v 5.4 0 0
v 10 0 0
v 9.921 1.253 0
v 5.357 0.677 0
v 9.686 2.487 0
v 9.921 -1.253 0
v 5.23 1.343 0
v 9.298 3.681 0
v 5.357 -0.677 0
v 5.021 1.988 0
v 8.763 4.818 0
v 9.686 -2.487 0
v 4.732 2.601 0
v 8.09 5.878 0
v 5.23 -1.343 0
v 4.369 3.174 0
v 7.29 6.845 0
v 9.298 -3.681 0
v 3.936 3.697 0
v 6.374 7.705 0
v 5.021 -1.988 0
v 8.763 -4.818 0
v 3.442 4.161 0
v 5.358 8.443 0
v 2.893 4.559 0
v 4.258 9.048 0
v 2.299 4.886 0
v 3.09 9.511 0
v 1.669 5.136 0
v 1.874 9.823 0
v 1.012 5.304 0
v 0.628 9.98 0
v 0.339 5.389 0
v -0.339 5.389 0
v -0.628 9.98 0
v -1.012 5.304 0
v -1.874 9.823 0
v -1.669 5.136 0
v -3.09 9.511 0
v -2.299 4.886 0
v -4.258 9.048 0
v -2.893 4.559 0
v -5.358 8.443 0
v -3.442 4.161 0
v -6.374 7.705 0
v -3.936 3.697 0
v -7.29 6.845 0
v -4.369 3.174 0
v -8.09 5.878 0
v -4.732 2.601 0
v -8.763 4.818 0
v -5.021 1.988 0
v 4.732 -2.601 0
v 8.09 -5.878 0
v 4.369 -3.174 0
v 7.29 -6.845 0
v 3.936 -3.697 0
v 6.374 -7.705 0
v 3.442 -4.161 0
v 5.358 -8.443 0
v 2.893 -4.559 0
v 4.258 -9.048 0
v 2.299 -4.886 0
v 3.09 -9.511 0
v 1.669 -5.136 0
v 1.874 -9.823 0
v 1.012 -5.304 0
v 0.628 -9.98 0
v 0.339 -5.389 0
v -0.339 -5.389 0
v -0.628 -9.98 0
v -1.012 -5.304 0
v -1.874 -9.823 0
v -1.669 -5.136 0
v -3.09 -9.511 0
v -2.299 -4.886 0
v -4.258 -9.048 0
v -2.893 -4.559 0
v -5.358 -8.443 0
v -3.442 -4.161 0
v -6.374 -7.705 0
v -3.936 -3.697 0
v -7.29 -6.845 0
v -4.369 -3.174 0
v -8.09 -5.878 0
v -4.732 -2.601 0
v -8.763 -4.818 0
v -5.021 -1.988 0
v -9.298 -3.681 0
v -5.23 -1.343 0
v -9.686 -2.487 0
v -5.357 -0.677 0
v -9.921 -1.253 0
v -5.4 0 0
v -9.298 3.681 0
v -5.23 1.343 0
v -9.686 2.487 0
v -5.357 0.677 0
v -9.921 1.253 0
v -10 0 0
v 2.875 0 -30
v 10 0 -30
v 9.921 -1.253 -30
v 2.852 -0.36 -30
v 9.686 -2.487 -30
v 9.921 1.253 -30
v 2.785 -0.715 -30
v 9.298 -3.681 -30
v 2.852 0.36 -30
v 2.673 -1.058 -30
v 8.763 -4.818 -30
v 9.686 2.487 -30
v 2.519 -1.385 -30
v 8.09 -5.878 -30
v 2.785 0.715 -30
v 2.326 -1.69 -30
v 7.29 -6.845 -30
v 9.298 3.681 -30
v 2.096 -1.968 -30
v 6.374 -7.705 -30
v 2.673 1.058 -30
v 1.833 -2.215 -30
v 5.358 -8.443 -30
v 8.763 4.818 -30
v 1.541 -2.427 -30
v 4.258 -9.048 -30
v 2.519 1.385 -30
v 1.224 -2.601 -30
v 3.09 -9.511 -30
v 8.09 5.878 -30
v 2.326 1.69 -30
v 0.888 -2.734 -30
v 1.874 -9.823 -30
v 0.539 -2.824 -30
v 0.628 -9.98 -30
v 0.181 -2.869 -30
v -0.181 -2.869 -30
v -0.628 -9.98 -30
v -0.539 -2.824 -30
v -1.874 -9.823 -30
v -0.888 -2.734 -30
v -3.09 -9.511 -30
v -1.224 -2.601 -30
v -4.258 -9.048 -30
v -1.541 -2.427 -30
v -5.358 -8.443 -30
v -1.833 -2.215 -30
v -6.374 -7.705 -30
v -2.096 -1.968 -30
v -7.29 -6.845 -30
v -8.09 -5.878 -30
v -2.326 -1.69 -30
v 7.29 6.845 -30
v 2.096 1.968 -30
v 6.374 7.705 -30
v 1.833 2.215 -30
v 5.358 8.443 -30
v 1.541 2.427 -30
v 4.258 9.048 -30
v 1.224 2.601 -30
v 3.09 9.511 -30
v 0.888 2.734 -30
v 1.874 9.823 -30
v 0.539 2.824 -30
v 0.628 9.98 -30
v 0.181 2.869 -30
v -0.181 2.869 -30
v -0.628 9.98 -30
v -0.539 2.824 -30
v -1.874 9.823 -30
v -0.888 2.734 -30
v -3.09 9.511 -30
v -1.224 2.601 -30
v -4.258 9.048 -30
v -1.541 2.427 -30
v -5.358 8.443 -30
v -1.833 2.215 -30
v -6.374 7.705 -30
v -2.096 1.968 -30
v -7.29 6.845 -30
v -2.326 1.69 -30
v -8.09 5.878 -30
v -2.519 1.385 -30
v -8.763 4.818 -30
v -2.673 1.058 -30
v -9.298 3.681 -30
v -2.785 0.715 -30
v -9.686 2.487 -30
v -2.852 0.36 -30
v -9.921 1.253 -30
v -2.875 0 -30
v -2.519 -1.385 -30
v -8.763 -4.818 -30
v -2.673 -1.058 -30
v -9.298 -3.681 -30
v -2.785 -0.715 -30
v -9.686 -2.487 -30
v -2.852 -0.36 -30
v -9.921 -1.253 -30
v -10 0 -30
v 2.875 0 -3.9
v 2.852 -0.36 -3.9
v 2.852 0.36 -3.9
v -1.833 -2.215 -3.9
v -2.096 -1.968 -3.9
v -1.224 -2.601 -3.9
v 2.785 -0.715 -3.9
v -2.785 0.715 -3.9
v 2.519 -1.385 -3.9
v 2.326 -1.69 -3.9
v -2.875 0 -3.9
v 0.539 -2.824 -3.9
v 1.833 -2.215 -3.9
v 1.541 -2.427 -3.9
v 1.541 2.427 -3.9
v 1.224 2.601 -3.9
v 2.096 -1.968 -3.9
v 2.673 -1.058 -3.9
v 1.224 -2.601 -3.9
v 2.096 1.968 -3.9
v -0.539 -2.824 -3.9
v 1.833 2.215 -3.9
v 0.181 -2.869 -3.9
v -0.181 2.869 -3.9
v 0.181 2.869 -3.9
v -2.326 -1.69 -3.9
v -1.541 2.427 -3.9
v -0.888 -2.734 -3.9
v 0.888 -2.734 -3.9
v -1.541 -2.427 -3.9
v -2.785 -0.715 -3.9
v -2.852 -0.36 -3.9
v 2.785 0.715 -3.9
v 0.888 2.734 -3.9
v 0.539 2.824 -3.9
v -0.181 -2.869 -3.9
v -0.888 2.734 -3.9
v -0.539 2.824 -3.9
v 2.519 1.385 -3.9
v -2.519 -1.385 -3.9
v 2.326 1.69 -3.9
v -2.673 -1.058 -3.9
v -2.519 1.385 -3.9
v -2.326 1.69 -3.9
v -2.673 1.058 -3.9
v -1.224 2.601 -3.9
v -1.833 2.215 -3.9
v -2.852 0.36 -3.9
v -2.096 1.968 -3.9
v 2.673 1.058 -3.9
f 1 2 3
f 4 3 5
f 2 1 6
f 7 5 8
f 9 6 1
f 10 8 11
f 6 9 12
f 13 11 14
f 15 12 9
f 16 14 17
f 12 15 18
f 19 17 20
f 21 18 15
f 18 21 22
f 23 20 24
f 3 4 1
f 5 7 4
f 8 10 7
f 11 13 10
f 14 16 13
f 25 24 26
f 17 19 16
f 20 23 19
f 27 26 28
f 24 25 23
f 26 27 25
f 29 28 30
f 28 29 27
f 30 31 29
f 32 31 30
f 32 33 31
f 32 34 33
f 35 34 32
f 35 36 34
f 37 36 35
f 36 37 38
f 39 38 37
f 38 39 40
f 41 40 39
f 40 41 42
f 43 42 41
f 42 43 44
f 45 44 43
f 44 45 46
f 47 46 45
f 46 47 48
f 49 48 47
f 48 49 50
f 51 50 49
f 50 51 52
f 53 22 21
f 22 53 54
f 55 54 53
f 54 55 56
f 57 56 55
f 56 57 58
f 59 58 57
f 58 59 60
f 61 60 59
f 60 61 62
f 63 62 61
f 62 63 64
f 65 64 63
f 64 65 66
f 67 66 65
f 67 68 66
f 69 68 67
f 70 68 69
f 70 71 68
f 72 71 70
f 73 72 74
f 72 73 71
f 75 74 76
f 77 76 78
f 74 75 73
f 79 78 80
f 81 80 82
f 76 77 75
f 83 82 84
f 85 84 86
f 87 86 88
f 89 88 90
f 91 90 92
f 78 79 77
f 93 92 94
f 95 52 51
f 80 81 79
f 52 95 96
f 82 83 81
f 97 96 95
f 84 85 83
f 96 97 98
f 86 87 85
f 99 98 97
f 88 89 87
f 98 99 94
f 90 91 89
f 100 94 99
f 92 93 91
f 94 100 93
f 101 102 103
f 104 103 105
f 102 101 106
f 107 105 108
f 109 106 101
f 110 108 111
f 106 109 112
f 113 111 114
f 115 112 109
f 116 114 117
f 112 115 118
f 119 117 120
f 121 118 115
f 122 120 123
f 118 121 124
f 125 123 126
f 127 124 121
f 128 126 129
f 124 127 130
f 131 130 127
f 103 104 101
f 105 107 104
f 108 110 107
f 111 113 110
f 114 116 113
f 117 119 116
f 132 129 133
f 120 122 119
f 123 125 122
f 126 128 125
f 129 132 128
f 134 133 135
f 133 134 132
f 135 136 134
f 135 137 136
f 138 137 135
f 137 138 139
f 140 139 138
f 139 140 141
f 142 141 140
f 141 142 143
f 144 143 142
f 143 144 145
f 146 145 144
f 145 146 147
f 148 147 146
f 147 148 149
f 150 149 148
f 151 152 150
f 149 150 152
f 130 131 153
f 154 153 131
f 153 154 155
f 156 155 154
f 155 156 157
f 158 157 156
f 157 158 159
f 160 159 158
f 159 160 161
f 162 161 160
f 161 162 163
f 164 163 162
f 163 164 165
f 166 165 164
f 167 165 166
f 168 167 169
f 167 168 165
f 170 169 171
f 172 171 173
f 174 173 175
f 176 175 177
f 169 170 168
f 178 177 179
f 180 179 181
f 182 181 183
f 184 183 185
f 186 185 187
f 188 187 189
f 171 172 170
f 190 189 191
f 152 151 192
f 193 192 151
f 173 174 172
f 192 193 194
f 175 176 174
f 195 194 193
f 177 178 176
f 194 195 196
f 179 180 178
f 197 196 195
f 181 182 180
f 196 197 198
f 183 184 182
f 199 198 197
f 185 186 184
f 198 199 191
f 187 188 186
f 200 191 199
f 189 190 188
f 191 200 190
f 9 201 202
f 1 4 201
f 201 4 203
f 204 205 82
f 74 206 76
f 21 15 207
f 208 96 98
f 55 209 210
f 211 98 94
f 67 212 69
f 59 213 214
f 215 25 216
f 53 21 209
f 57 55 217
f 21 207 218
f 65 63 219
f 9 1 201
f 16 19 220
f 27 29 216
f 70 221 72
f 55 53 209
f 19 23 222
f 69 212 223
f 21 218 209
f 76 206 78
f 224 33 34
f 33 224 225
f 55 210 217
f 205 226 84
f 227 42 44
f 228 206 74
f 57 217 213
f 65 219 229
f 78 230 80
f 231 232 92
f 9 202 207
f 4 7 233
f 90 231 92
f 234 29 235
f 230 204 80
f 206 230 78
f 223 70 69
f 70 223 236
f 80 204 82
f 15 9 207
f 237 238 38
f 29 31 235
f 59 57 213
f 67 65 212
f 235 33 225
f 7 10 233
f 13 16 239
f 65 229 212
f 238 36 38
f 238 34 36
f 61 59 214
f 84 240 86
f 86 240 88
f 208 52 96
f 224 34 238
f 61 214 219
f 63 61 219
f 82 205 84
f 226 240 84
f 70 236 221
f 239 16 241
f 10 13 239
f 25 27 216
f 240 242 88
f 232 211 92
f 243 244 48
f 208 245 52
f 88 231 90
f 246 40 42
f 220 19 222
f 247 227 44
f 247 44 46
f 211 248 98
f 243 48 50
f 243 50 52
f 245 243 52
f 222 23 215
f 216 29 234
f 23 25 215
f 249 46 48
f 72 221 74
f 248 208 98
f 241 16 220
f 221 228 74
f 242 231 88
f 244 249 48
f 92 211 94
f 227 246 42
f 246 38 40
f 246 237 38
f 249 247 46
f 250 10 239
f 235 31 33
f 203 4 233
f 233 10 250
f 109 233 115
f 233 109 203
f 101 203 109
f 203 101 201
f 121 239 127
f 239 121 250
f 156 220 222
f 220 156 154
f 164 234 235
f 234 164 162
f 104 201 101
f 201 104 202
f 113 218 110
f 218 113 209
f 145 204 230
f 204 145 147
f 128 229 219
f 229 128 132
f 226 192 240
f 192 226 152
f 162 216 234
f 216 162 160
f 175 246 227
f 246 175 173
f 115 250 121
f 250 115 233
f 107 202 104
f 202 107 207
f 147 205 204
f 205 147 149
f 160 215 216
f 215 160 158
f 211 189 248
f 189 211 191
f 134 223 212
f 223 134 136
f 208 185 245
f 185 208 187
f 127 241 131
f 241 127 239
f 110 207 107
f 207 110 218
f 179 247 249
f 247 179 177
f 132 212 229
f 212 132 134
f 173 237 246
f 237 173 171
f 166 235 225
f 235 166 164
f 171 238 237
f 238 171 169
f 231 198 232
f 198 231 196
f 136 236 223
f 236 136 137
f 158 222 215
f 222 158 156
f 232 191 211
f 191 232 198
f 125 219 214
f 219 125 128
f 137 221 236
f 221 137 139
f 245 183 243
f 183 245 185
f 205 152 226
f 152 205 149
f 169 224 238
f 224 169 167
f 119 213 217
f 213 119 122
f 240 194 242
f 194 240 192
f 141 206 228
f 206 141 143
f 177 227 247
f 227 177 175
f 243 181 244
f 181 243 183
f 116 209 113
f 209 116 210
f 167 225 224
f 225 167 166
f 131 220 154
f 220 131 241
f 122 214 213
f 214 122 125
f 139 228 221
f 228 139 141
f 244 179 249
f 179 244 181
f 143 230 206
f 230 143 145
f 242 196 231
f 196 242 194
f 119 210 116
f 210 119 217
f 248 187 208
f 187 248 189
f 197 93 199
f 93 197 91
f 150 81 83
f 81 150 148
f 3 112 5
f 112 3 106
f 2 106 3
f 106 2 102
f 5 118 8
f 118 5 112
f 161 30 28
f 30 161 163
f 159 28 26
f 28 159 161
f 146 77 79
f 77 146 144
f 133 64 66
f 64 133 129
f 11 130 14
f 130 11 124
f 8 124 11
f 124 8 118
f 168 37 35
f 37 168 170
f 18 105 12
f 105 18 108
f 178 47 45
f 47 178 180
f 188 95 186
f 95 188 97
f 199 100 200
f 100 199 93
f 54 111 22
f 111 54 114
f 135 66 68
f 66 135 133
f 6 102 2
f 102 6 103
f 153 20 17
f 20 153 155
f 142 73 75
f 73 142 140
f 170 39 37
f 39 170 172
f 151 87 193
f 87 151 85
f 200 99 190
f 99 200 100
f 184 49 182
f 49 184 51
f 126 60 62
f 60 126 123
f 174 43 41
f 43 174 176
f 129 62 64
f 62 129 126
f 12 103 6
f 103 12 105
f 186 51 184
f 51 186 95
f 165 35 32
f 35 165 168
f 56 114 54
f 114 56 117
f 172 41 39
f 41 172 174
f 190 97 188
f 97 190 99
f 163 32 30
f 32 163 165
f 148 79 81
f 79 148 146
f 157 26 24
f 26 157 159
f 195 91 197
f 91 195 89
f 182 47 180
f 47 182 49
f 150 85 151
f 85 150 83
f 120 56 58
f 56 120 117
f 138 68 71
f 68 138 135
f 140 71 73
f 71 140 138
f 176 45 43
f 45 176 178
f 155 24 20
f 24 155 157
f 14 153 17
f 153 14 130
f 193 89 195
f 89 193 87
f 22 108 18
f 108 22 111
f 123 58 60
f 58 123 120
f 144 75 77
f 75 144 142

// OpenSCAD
$fn = 50;


difference() {
	union() {
		translate(v = [0, 0, -30.0000000000]) {
			cylinder(h = 30, r = 10.0000000000);
		}
		cylinder(h = 0, r = 19.0000000000);
	}
	union() {
		translate(v = [0, 0, 0]) {
			rotate(a = [0, 0, 0]) {
				difference() {
					union() {
						#translate(v = [0, 0, -30.0000000000]) {
							cylinder(h = 30, r = 2.6000000000);
						}
						#translate(v = [0, 0, -3.9000000000]) {
							cylinder(h = 3.9000000000, r1 = 2.8750000000, r2 = 5.4000000000);
						}
						#translate(v = [0, 0, -30.0000000000]) {
							cylinder(h = 30, r = 2.8750000000);
						}
						#translate(v = [0, 0, -30.0000000000]) {
							cylinder(h = 30, r = 2.6000000000);
						}
					}
					union();
				}
			}
		}
	}
}
